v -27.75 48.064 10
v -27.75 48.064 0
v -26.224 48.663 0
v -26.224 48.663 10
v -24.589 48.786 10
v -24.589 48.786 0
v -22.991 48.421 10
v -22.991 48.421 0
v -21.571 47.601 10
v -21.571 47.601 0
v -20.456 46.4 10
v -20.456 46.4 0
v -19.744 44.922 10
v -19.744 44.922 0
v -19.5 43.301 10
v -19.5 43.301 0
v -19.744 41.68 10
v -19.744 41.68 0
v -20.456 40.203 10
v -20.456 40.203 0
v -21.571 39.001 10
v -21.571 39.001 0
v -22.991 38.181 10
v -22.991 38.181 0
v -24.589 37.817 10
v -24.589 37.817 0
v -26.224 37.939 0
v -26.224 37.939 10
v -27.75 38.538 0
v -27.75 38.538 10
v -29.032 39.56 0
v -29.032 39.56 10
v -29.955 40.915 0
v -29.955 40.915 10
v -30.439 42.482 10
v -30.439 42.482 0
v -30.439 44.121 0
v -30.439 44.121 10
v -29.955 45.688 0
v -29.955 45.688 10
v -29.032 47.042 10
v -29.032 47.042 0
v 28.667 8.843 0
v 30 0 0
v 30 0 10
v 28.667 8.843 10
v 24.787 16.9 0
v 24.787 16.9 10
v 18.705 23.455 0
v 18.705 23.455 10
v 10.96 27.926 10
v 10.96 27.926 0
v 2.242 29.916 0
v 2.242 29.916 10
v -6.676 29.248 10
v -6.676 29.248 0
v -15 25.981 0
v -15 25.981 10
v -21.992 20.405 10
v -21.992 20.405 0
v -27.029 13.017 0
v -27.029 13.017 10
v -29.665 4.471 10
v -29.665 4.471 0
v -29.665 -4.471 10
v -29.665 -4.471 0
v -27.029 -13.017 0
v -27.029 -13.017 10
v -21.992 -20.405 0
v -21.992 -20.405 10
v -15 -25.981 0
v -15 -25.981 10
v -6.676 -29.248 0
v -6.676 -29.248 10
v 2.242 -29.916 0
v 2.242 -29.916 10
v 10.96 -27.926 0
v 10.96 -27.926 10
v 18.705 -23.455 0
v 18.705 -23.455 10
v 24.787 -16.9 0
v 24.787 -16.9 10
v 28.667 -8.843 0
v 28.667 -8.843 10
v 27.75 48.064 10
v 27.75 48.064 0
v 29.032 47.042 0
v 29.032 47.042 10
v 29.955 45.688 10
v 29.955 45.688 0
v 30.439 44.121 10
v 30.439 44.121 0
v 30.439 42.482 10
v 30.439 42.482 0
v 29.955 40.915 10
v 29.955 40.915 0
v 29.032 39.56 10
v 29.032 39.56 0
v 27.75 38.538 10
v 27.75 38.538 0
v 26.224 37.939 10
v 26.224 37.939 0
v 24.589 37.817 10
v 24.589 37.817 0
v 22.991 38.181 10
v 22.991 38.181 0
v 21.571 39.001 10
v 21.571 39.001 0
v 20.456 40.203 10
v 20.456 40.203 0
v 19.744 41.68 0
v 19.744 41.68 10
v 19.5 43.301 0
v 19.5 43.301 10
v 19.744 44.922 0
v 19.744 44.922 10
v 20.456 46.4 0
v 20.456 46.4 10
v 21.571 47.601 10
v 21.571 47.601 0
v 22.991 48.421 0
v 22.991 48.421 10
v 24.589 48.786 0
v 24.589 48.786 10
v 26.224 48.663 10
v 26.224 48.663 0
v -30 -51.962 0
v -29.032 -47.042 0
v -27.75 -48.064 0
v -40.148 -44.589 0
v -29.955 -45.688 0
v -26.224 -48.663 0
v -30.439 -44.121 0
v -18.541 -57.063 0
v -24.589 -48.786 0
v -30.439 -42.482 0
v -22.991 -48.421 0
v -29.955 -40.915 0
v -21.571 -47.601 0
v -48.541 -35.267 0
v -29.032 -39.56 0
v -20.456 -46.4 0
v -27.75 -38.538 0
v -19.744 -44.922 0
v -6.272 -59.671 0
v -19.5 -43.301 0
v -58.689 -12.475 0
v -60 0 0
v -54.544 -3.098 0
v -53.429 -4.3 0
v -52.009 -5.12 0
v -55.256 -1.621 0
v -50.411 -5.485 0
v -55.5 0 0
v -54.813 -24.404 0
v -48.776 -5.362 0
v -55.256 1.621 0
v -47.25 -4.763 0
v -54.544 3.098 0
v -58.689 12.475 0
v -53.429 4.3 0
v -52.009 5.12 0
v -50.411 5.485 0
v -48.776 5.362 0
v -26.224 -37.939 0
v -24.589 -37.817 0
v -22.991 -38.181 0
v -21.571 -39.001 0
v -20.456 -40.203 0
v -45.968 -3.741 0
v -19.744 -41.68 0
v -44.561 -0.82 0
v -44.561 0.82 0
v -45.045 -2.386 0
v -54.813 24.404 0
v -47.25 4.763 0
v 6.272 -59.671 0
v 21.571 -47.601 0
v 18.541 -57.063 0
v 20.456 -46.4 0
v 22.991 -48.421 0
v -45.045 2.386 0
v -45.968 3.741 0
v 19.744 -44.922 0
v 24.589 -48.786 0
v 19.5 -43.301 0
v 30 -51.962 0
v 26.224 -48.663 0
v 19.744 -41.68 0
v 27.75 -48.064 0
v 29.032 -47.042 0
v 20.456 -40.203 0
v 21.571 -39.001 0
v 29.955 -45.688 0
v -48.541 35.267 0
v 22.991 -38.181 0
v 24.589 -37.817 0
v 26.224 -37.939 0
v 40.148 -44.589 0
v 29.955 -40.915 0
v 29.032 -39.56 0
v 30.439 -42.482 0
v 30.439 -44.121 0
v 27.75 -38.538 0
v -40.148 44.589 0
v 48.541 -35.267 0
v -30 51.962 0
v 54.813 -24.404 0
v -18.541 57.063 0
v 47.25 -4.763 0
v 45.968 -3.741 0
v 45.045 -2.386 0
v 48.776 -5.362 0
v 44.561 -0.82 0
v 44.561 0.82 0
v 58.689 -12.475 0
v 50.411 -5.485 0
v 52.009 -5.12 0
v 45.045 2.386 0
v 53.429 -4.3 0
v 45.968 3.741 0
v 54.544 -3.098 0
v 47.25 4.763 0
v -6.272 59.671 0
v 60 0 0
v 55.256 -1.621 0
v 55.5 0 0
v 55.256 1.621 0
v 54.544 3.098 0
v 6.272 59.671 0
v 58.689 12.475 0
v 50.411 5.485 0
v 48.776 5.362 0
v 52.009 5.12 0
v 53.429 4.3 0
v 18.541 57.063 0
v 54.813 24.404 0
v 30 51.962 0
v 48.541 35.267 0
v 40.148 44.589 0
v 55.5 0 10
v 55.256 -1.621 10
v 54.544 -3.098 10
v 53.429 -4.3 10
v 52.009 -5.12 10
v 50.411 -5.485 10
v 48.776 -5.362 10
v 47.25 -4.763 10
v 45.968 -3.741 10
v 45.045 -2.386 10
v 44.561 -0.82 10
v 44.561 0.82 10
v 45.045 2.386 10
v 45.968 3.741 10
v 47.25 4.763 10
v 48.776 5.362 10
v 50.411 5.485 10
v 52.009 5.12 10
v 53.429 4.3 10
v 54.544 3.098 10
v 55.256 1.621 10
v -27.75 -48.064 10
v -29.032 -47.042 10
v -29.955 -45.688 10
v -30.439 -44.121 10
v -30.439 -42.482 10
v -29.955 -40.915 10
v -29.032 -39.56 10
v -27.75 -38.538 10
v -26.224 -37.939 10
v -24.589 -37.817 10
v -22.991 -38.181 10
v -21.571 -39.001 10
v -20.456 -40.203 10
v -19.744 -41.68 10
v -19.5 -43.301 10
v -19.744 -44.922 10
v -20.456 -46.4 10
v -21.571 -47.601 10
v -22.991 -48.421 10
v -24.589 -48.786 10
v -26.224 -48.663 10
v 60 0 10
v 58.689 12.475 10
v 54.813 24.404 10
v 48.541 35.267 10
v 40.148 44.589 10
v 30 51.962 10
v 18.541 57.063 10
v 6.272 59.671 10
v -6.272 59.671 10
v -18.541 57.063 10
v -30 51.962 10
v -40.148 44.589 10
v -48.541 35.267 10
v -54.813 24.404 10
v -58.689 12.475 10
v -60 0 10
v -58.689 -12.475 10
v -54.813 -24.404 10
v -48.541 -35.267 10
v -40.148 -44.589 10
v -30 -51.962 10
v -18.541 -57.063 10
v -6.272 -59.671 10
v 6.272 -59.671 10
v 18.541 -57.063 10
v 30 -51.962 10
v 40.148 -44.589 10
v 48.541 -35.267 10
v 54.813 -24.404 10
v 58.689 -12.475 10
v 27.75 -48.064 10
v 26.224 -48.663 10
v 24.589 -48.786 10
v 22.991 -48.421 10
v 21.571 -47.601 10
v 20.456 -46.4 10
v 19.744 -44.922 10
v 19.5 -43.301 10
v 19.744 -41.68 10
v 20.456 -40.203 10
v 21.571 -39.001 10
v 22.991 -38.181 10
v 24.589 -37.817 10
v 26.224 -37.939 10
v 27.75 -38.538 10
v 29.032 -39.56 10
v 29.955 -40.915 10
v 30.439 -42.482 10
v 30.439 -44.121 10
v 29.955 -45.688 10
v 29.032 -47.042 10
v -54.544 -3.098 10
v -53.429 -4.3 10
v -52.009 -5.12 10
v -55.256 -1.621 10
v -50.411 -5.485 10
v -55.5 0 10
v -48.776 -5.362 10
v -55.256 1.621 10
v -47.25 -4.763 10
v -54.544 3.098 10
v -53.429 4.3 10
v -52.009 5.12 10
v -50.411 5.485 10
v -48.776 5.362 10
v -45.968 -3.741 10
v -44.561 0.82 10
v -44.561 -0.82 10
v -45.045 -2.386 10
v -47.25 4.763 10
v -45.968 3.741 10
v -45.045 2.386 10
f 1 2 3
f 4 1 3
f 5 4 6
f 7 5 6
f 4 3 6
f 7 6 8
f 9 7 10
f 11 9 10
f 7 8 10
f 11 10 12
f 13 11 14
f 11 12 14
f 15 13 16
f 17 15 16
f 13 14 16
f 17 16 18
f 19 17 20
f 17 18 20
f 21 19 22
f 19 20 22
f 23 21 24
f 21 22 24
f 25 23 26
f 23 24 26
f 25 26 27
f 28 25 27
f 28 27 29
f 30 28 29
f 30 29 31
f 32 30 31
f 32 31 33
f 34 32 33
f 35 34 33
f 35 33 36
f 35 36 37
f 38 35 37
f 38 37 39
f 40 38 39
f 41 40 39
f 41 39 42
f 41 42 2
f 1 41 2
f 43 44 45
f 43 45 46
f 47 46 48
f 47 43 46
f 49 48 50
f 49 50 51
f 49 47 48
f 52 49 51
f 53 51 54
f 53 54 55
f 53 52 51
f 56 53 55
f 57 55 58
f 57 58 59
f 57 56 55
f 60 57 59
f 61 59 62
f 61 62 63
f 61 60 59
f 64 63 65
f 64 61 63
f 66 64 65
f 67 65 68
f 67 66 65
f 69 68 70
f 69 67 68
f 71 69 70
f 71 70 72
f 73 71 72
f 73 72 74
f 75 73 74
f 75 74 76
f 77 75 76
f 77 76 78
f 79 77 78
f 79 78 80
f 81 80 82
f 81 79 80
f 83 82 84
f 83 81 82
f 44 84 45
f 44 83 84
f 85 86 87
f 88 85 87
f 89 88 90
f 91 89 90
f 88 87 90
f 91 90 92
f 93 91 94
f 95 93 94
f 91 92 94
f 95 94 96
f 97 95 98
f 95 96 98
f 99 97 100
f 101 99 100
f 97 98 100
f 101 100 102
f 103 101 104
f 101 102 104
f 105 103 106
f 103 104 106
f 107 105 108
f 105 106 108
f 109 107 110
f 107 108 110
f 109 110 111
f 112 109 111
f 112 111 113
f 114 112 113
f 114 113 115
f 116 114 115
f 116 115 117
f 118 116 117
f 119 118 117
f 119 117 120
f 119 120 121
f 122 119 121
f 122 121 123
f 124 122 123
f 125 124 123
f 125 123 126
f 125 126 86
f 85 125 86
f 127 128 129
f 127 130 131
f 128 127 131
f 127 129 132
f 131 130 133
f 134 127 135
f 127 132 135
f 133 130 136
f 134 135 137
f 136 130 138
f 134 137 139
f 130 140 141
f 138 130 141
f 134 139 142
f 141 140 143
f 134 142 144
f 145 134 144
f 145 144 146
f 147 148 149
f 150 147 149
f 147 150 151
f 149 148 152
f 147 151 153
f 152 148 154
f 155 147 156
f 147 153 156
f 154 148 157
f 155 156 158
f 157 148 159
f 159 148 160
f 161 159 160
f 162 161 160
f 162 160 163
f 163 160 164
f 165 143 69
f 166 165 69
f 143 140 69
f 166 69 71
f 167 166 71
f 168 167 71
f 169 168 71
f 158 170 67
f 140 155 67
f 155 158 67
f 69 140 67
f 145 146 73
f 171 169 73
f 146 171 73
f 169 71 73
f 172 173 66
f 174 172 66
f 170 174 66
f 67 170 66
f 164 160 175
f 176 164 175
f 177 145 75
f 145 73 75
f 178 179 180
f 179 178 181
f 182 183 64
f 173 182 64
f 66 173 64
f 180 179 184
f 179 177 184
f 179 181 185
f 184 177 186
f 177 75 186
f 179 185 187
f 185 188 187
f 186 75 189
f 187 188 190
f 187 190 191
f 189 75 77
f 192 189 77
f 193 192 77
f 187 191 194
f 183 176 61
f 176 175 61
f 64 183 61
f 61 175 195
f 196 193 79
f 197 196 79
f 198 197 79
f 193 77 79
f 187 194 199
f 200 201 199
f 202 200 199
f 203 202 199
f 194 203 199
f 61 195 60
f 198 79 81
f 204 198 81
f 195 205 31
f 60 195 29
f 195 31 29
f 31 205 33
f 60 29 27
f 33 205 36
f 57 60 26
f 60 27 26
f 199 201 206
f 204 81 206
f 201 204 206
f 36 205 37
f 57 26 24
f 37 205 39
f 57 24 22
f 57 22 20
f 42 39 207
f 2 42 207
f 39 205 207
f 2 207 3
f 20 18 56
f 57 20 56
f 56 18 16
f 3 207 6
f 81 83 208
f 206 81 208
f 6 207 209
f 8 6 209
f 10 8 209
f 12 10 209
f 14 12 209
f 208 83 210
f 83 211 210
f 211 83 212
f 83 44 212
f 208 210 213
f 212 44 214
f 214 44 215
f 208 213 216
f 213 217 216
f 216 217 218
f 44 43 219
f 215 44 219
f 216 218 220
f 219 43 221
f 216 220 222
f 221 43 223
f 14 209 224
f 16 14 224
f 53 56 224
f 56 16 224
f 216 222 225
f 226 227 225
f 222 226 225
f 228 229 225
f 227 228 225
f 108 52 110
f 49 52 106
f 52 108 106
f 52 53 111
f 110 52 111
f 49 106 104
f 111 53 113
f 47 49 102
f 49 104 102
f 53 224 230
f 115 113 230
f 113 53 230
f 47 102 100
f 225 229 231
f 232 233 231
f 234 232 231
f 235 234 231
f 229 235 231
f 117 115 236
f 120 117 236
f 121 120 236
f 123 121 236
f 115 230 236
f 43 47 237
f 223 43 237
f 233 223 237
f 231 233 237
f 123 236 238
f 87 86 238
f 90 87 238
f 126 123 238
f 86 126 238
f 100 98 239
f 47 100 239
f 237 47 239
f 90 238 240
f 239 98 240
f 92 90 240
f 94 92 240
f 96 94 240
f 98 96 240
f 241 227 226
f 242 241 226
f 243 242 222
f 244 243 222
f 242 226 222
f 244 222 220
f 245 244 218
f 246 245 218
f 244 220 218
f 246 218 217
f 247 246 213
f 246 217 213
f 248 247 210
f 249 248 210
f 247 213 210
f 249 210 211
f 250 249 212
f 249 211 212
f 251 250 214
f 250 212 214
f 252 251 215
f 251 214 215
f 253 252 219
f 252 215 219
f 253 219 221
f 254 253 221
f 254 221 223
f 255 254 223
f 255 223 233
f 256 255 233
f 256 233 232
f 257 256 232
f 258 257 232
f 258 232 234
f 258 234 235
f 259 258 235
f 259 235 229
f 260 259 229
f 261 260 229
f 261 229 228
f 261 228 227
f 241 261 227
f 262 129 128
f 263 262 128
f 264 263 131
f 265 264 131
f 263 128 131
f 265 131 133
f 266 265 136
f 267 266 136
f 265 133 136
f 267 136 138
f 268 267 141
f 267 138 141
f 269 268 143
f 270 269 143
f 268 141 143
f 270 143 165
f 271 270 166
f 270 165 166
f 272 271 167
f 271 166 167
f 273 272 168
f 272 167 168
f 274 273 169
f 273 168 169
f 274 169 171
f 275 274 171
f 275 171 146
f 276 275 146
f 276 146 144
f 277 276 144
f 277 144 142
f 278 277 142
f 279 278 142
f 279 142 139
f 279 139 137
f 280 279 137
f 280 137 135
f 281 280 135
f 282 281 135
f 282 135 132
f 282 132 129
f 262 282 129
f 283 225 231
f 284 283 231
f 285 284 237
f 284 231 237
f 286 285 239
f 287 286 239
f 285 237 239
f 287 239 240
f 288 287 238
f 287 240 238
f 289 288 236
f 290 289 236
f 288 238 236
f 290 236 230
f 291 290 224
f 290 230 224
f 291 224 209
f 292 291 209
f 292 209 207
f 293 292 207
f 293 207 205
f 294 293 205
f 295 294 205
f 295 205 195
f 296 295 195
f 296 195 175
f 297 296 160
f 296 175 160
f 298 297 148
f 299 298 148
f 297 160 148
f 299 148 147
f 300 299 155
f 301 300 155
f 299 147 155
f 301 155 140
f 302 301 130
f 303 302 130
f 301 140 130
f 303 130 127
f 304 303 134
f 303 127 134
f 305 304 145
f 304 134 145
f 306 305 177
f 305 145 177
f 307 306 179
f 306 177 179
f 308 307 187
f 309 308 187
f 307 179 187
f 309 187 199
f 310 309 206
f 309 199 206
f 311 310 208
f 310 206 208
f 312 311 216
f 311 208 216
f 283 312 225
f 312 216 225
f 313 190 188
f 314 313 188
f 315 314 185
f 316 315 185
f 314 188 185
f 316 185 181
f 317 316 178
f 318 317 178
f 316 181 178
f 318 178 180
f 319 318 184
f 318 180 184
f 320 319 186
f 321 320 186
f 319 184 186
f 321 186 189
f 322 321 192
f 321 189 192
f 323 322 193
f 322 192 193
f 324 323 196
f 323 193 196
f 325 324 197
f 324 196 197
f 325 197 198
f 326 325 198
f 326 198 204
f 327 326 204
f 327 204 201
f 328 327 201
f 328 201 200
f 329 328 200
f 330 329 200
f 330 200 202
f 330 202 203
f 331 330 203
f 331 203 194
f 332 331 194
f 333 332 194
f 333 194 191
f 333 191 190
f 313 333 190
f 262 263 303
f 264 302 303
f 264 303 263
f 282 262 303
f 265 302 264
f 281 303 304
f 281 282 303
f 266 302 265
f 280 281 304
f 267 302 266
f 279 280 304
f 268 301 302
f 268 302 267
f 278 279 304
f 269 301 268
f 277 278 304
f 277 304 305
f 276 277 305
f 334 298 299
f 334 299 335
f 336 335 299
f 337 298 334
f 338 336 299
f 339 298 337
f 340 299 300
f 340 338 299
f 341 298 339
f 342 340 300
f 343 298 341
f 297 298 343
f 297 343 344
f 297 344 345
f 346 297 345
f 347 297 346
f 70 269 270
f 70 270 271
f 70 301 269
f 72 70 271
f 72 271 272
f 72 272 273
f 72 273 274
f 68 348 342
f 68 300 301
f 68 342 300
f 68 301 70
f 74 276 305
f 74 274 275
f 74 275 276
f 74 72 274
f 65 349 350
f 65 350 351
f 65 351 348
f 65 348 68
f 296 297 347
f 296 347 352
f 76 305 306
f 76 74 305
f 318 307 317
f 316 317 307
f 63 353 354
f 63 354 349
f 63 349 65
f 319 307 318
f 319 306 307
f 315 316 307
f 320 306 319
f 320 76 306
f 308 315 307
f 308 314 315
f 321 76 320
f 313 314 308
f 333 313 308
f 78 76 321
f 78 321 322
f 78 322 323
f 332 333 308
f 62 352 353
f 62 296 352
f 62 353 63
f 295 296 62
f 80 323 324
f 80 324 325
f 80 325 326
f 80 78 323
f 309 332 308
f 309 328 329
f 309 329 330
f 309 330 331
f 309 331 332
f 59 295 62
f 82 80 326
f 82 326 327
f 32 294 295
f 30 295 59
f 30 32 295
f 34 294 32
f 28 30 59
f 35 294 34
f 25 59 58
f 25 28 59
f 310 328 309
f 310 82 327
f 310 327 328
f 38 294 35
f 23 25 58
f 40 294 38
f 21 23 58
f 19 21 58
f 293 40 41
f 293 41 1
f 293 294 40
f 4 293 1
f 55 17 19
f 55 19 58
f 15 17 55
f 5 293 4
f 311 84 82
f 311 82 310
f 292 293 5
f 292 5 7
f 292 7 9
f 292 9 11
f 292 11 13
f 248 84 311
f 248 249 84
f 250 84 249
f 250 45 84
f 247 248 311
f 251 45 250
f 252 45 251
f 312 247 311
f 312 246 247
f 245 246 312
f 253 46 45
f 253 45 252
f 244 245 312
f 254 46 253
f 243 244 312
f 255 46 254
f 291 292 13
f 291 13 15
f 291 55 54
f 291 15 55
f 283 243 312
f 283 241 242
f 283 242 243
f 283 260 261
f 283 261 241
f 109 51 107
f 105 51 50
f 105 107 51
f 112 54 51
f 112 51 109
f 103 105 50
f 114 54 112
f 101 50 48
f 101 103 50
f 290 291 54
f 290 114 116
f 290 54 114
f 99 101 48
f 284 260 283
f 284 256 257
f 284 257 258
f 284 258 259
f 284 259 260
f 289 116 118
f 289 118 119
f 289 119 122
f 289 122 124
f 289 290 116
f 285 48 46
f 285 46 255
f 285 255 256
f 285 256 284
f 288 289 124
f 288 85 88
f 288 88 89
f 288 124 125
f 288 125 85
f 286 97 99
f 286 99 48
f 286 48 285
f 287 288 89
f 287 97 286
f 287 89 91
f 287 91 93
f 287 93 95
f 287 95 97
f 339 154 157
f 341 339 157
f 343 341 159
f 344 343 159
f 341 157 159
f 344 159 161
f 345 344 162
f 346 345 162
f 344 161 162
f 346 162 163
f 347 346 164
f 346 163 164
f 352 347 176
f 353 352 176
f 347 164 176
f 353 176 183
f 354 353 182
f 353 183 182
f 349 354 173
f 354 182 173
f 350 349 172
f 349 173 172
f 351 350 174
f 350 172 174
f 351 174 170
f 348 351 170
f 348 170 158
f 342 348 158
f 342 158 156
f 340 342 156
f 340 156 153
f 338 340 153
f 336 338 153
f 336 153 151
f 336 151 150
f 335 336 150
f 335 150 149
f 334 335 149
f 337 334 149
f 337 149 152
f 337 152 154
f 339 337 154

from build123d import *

# Parameters (mm, degrees)
F0_R            = 60
F0_R_2          = 30
F1_DEPTH        = 10
F3_D            = 11
F3_COPIES_COUNT = 6


# Not quite as in the source:
# - a pattern or mirror of a feature is missing from the dataset's text; its kind, count and spacing are read off the source's solid


with BuildPart() as f1:
    # F0 (on Top) → F1 (new body)
    with BuildSketch(Plane.XY):
        Circle(F0_R)
        Circle(F0_R_2, mode=Mode.SUBTRACT)
    extrude(amount=F1_DEPTH)

    # F3 (through all)
    with Locations(Plane.XY.offset(10)):
        with Locations((-50, 0)):
            f3 = Hole(F3_D / 2)

    # F3_copies: F3 ×6 about axis
    f3_copies_axis = Axis((0, 0, 0), (0, 0, 1))
    for i in range(1, F3_COPIES_COUNT):
        add(f3.rotate(f3_copies_axis, i * 360 / F3_COPIES_COUNT), mode=Mode.SUBTRACT)


solid = f1.part
